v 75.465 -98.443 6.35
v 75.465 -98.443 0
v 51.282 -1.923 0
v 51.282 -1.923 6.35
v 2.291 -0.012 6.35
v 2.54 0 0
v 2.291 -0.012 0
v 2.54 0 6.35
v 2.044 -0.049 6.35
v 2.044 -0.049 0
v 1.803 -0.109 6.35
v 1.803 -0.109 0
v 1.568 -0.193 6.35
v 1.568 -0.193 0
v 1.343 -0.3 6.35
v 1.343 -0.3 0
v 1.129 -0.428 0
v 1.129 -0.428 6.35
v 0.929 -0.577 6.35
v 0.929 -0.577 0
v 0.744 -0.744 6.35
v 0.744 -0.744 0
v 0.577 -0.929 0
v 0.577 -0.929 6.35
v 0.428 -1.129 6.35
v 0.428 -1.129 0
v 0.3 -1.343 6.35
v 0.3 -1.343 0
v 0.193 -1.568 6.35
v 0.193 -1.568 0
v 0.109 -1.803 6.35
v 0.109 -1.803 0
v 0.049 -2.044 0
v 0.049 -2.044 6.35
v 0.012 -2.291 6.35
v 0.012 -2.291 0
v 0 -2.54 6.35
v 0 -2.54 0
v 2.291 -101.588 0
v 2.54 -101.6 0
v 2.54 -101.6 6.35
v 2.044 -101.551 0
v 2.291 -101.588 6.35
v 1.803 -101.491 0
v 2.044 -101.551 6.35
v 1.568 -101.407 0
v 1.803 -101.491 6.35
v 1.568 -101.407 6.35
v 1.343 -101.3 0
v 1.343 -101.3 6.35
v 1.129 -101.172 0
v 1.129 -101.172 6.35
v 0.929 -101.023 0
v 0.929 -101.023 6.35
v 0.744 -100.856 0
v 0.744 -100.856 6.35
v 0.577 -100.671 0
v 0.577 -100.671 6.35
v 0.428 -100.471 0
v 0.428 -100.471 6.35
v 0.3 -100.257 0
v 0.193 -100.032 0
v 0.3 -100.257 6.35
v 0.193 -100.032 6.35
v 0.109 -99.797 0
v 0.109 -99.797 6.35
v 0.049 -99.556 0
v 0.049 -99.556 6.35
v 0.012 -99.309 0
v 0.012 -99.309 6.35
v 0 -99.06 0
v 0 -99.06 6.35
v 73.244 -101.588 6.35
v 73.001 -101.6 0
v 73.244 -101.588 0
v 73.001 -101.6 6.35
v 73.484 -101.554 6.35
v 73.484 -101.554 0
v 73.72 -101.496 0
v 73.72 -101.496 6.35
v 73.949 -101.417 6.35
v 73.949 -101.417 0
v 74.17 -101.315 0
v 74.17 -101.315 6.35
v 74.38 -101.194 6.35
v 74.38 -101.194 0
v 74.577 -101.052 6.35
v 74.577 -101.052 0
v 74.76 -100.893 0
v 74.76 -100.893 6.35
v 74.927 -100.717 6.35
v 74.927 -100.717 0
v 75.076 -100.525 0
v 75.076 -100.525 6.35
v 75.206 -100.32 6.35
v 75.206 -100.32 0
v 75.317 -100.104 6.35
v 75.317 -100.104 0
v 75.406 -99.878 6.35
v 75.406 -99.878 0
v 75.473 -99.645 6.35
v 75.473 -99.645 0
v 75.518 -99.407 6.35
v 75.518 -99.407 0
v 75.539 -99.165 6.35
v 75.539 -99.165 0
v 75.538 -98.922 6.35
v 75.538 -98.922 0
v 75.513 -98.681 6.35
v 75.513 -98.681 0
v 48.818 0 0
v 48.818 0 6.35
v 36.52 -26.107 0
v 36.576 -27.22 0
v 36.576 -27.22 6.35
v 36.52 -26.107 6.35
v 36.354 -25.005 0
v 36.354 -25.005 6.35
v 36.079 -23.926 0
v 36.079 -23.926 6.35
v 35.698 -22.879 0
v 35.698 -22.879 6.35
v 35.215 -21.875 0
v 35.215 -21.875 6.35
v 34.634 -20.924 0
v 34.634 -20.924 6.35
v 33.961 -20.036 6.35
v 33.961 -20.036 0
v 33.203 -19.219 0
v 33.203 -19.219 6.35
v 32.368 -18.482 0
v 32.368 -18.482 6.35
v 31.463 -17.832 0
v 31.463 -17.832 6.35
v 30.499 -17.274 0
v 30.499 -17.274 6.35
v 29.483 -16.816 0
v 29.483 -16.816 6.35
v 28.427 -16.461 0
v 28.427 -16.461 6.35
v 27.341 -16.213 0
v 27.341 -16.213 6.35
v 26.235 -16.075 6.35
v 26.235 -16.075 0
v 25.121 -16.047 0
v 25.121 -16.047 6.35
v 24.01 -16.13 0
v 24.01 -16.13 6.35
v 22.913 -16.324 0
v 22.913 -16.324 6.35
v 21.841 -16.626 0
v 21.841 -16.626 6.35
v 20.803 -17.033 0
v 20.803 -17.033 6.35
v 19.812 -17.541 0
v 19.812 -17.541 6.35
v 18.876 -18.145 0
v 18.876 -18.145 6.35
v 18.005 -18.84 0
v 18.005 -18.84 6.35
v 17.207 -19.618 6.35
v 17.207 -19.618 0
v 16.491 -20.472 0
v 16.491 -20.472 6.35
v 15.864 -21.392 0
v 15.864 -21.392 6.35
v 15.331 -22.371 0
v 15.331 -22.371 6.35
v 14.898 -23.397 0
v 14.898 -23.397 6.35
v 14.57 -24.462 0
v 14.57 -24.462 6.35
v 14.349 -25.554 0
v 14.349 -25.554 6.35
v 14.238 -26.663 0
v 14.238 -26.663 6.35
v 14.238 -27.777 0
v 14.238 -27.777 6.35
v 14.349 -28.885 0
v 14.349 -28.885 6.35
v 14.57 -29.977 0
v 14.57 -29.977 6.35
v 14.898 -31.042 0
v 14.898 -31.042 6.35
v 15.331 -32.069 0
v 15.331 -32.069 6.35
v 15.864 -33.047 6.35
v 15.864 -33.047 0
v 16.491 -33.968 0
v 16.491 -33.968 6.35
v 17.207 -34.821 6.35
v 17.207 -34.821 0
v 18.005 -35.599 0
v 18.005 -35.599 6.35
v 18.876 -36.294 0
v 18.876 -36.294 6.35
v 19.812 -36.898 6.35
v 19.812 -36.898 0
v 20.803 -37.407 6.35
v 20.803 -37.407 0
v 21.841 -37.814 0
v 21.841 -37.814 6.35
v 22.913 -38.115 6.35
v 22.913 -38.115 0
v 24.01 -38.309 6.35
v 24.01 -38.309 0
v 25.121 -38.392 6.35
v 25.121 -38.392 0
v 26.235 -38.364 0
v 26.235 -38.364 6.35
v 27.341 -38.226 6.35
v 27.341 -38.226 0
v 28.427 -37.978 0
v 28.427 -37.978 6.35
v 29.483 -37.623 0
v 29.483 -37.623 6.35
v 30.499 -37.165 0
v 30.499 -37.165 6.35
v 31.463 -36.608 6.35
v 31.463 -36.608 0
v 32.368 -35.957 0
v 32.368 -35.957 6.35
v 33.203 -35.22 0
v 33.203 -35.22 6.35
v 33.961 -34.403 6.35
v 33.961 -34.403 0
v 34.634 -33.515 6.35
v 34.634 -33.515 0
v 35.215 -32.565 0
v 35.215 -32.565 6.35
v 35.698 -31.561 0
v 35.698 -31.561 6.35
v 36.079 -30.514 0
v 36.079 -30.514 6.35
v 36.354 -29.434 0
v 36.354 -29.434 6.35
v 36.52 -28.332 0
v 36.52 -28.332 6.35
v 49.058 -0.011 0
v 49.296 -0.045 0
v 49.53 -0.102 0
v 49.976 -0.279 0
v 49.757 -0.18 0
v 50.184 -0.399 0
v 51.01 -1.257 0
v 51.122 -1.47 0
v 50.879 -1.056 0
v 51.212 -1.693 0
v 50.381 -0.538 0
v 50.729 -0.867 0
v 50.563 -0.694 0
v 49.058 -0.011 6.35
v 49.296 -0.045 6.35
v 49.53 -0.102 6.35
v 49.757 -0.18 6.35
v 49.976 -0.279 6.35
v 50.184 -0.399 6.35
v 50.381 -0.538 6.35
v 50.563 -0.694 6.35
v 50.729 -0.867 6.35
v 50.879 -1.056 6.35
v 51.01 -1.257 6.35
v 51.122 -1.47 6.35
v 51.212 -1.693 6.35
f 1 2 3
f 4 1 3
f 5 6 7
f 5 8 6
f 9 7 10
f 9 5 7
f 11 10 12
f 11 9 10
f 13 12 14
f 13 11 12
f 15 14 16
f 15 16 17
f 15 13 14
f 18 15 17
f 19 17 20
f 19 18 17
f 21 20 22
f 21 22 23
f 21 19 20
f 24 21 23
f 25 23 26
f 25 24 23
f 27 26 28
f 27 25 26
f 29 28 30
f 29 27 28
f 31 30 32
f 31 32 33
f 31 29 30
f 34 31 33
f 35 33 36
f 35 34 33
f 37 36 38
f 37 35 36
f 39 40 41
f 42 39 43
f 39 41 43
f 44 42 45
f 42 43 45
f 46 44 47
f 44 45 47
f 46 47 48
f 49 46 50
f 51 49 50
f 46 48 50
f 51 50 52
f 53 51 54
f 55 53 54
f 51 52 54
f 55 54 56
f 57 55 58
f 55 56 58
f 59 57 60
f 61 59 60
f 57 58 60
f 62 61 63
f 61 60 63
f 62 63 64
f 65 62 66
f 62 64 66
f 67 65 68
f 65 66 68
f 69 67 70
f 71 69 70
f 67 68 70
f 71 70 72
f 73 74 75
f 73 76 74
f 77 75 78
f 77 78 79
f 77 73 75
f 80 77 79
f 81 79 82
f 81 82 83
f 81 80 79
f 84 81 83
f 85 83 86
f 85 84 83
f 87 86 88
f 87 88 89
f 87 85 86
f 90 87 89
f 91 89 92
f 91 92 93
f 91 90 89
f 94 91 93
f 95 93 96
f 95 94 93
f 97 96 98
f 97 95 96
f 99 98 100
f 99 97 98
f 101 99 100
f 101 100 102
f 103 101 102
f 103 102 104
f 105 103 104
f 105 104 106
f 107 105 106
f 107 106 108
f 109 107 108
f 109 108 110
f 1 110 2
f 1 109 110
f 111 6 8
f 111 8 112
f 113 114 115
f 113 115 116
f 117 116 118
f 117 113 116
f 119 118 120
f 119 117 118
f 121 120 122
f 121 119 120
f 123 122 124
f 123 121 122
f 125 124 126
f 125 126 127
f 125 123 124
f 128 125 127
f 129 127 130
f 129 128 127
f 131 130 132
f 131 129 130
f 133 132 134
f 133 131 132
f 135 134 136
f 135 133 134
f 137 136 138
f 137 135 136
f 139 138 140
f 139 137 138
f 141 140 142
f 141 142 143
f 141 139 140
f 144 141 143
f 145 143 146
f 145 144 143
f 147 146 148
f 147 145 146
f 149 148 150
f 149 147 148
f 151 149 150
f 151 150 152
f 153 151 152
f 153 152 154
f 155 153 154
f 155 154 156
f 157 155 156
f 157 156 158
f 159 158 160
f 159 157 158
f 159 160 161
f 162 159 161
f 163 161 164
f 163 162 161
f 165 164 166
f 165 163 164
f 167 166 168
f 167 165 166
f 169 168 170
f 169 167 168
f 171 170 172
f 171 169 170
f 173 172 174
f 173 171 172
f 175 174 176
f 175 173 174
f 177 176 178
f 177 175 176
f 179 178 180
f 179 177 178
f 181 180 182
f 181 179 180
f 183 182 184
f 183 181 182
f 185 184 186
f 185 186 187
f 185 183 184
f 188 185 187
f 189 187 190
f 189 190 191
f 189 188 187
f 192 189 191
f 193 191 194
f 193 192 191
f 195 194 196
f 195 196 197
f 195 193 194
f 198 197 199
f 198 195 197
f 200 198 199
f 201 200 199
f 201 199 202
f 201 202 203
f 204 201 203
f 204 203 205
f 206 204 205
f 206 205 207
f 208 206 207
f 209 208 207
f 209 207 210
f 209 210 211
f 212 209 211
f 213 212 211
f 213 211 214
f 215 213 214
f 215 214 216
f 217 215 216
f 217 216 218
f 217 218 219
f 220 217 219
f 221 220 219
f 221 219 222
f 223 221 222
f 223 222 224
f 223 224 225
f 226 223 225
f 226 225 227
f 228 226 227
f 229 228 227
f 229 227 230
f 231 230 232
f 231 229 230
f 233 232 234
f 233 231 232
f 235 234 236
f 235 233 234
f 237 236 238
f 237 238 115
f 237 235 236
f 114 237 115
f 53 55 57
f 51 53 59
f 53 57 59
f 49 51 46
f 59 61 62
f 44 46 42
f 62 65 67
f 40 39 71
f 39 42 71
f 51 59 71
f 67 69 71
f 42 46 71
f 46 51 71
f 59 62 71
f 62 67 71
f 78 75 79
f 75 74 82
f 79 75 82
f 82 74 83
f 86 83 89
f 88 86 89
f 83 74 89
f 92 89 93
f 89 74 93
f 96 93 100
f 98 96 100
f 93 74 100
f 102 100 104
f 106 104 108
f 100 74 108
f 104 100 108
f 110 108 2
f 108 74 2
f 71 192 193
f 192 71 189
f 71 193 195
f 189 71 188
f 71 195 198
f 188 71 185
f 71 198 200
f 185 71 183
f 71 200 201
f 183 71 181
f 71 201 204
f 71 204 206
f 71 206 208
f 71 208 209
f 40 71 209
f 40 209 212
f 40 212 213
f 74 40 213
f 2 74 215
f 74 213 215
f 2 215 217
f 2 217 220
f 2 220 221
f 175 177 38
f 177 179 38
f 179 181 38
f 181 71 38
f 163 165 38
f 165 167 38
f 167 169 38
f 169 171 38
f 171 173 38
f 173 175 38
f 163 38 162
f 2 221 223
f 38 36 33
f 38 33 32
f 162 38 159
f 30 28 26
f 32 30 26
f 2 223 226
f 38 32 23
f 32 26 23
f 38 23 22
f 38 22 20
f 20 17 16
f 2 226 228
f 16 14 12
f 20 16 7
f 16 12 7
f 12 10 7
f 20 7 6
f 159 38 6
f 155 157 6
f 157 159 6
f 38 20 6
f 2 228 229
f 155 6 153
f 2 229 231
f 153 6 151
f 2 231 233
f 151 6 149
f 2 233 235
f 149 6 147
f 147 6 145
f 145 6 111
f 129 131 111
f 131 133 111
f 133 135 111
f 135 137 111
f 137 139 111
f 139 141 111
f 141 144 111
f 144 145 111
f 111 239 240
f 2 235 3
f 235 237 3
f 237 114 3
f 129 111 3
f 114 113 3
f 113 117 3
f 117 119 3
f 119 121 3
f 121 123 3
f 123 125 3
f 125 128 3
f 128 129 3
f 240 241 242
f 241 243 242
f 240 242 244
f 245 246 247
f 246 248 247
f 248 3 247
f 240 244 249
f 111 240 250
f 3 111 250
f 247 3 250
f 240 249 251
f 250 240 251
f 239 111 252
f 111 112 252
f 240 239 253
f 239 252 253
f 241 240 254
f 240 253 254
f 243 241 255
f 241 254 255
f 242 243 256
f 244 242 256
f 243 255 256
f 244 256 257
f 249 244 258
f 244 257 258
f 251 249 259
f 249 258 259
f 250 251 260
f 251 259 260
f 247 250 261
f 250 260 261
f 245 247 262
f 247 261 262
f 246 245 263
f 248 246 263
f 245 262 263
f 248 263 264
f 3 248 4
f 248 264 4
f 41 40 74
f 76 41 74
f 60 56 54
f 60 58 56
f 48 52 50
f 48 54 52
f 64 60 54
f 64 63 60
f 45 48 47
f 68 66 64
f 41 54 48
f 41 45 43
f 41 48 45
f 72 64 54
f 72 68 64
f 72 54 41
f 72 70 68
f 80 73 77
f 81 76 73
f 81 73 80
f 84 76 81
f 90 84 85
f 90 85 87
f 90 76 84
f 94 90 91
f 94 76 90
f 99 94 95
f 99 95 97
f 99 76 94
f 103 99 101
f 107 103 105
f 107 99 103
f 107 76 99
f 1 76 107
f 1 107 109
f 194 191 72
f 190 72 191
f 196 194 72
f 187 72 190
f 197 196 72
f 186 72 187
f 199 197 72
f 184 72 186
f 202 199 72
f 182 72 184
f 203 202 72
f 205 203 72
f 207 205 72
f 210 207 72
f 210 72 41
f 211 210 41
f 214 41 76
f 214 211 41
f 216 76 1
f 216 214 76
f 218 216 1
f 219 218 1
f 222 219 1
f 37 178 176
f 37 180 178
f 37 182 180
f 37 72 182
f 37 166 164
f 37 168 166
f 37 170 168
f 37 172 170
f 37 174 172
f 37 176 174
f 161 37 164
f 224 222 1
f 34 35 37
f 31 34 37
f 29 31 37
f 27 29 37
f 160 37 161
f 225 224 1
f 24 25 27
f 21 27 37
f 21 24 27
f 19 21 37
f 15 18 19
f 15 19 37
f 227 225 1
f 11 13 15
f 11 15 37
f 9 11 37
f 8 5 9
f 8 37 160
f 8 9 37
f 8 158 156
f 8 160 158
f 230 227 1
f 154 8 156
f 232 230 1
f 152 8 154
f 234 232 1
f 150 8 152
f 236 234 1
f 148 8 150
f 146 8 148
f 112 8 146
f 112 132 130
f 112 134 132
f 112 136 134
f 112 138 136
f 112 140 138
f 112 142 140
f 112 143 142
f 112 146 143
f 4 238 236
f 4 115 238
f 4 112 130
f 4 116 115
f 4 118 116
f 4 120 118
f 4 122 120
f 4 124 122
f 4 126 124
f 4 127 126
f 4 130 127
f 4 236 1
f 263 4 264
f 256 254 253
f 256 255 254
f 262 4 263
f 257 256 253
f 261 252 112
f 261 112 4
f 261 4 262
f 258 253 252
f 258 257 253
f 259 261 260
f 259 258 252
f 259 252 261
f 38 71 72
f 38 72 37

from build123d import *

# Parameters (mm, degrees)
SKETCH1_W           = 50.8
SKETCH1_H           = 101.6
SKETCH1_R           = 11.176
BOSS_EXTRUDE1_DEPTH = 6.35
FILLET1_R           = 2.54


with BuildPart() as part:
    # Sketch1 → Boss-Extrude1 (new body)
    # profile 1 of 2: a face of its own
    with BuildSketch(Plane.XY):
        with Locations((25.4, -50.8)):
            Rectangle(SKETCH1_W, SKETCH1_H)
        with Locations((25.4, -27.219704654)):
            Circle(SKETCH1_R, mode=Mode.SUBTRACT)
    # profile 2 of 2: a face of its own
    with BuildSketch(Plane.XY):
        Polygon((50.8, -101.6), (76.256220575, -101.6), (50.8, 0), align=None)
    extrude(amount=BOSS_EXTRUDE1_DEPTH)

    # Fillet1
    fillet1_edges = [part.edges().sort_by_distance(p)[0] for p in [
        (0, -101.6, 3.175),
        (0, 0, 3.175),
        (50.8, 0, 3.175),
        (76.256220575, -101.6, 3.175),
    ]]
    fillet(fillet1_edges, radius=FILLET1_R)


solid = part.part
